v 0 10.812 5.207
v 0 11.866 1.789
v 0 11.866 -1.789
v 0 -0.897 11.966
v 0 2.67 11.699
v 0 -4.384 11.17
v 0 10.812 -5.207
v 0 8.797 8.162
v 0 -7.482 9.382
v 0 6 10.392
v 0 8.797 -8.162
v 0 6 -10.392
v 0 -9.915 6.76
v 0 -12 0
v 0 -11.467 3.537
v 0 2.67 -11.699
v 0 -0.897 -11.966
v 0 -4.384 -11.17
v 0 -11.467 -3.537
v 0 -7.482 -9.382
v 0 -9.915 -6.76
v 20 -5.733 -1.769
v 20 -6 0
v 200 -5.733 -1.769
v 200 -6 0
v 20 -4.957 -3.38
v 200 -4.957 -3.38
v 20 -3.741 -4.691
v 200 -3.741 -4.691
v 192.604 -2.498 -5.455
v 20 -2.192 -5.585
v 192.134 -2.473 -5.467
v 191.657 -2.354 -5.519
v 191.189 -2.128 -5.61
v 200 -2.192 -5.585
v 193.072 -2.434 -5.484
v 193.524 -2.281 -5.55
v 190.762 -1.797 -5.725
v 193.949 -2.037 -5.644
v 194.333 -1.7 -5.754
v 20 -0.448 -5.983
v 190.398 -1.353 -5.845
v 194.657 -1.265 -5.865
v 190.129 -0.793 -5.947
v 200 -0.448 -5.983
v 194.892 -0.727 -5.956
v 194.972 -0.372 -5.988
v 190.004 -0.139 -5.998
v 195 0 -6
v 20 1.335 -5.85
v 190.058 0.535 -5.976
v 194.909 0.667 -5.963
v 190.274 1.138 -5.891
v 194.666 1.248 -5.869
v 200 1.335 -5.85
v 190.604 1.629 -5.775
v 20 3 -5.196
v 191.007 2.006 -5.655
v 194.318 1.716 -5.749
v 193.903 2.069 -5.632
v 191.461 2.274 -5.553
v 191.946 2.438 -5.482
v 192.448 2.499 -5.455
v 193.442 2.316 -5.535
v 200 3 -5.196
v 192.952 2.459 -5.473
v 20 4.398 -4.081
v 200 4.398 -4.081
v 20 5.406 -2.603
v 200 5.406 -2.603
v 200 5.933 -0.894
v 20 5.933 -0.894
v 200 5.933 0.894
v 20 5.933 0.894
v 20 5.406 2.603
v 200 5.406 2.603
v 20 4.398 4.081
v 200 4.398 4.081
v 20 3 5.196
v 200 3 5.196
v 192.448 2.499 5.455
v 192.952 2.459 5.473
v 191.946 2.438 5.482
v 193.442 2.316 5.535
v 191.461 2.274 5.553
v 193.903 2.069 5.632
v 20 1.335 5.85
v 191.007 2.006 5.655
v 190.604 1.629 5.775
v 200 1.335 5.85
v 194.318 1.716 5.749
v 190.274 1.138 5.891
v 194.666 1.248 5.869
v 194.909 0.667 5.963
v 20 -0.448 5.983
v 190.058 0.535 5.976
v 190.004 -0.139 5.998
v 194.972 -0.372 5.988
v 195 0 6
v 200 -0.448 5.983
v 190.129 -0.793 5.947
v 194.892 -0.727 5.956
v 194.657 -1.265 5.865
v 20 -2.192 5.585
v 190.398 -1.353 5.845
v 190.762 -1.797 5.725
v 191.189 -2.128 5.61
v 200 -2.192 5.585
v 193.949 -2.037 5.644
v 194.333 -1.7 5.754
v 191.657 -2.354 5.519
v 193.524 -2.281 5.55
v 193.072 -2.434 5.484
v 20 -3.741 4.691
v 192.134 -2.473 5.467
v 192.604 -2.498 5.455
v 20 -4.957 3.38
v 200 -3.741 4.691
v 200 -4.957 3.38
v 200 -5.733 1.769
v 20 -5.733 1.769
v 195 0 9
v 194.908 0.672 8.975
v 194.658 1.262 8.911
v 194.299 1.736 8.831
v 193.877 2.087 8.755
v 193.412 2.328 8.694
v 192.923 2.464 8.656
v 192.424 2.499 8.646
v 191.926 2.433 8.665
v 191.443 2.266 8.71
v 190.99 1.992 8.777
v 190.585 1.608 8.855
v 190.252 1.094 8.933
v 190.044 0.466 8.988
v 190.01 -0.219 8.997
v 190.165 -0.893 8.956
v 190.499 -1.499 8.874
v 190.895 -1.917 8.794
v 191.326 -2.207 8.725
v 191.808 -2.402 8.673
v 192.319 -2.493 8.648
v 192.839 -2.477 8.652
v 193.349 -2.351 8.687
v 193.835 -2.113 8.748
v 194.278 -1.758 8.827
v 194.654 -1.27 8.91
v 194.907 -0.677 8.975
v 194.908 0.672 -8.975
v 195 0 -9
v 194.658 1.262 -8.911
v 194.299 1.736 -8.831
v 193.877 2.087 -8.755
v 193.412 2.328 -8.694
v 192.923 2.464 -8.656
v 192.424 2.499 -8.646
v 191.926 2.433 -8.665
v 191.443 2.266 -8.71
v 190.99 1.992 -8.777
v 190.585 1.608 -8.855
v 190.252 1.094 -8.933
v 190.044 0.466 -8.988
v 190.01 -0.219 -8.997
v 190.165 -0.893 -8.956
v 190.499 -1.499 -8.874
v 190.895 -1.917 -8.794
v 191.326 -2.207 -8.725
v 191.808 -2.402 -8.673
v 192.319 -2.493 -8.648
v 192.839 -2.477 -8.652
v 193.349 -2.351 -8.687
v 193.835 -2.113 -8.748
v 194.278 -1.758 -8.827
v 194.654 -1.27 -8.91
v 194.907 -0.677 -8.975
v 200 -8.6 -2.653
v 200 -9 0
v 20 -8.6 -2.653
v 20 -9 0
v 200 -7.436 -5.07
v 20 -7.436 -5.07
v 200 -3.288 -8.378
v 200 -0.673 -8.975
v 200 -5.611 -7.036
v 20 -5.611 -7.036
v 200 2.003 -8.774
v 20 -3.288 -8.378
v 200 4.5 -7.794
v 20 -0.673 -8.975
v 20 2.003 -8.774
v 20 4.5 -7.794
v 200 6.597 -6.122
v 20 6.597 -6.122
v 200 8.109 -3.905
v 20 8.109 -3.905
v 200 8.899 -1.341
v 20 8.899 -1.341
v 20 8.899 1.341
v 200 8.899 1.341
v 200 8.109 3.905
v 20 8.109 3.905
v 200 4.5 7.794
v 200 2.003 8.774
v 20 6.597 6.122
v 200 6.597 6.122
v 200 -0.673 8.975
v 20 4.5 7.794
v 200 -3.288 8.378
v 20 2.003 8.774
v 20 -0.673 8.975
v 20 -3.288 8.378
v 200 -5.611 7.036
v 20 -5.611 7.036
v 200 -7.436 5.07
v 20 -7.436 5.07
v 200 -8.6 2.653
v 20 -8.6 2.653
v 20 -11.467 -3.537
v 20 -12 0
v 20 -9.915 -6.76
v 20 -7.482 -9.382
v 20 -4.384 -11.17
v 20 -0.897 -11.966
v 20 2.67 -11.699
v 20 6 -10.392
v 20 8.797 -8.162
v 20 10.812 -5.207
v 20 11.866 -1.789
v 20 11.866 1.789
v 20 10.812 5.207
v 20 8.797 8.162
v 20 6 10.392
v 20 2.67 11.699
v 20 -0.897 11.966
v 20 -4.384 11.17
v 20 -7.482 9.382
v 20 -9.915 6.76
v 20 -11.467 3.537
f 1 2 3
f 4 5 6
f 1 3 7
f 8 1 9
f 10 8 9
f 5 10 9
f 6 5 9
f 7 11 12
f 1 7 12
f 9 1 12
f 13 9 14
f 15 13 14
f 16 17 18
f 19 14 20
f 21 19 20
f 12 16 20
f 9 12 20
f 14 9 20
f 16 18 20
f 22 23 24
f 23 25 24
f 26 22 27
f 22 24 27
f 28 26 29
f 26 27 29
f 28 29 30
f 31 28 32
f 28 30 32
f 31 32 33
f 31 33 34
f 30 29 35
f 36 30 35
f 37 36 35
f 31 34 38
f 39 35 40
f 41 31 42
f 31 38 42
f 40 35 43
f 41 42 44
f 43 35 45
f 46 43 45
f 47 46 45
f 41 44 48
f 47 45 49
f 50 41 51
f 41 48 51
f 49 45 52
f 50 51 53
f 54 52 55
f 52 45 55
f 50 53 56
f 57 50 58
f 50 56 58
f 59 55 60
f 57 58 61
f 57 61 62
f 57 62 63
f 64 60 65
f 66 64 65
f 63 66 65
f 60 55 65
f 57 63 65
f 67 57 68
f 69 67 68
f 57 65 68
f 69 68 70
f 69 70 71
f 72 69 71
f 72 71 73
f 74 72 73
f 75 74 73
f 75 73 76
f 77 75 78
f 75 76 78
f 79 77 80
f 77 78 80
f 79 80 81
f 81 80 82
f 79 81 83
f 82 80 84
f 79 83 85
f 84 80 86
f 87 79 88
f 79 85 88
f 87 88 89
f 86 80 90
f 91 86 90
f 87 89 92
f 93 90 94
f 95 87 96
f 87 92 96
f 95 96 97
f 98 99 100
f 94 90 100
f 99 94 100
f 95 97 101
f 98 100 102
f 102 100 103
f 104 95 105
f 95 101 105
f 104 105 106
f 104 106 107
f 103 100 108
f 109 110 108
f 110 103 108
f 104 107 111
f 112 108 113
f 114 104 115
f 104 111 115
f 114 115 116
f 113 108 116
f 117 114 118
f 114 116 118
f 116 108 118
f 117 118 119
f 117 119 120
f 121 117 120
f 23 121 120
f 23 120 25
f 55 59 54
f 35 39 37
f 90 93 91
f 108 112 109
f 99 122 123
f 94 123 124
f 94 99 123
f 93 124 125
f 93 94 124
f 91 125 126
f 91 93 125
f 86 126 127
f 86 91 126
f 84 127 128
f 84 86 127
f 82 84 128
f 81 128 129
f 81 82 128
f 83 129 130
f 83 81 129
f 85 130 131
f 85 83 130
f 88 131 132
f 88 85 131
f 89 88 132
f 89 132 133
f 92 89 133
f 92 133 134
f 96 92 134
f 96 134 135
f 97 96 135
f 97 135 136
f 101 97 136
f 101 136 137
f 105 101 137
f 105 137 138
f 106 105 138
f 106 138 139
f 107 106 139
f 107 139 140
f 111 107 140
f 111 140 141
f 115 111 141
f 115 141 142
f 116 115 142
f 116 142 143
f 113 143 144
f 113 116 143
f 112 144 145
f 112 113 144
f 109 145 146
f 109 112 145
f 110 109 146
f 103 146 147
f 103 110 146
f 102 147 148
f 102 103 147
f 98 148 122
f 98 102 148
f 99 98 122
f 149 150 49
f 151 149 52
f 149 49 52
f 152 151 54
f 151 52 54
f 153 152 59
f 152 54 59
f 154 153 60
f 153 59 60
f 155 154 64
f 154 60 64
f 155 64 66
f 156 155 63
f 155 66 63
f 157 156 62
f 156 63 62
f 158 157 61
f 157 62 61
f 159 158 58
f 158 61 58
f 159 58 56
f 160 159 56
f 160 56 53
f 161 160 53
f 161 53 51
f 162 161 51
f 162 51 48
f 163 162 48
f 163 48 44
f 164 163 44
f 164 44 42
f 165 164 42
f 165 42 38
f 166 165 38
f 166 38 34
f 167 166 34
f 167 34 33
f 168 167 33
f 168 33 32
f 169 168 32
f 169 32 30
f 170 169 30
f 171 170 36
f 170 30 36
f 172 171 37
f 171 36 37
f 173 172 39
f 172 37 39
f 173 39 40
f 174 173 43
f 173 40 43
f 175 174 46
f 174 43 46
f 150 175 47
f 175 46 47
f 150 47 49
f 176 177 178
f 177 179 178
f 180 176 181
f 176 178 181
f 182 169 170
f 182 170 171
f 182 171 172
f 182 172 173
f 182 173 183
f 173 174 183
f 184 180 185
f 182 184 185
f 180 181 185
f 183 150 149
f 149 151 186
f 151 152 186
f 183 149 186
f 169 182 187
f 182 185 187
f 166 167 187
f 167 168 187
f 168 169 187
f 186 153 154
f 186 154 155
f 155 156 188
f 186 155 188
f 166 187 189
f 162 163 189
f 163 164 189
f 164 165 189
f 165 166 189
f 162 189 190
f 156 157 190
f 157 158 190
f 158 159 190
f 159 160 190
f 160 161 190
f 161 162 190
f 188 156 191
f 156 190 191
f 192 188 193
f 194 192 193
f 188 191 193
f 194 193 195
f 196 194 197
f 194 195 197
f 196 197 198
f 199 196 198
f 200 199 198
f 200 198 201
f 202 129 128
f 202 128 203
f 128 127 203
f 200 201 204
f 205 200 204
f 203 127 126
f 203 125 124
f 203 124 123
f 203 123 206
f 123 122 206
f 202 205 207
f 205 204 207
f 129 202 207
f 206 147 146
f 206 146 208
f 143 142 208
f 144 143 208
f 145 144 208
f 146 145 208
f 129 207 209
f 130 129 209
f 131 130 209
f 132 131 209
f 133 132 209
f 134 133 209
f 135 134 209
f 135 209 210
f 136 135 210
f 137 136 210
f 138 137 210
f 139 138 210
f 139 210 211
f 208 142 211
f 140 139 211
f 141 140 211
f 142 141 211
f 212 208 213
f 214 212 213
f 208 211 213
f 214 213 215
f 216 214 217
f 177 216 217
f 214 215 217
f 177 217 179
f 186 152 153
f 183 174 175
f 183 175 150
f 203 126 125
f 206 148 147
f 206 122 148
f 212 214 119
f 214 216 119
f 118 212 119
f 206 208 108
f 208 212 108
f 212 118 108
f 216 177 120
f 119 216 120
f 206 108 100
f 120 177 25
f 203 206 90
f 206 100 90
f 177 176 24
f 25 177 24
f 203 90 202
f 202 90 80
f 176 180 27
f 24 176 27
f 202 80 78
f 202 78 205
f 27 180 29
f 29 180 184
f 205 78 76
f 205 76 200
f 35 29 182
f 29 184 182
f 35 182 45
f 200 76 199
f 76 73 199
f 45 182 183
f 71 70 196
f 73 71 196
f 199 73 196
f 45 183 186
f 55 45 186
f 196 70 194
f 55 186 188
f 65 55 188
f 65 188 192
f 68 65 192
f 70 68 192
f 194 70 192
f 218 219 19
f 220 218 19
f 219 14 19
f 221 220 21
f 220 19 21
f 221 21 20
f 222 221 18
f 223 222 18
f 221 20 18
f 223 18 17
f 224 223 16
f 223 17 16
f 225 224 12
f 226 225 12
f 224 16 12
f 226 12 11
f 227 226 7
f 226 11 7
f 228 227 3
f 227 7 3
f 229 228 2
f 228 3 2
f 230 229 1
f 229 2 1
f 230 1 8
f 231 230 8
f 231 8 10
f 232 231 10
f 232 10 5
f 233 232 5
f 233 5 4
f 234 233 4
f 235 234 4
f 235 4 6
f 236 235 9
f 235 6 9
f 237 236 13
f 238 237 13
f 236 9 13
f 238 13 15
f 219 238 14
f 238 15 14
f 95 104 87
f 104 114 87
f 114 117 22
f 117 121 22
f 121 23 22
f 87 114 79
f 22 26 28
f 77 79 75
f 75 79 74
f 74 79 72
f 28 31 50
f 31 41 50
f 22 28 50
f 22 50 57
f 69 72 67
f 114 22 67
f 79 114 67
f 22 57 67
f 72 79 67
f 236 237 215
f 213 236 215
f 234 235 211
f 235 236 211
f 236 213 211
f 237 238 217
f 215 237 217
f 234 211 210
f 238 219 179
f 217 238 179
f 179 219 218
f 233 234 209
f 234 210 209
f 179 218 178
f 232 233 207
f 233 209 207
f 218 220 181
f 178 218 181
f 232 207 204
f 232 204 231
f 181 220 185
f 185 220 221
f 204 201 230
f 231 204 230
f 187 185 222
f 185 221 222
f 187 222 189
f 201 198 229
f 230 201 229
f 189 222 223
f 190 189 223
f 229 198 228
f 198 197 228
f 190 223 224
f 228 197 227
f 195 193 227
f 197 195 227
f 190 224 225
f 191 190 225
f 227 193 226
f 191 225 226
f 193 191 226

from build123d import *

# Parameters (mm, degrees)
SKETCH2_R               = 2.5
CUT_EXTRUDE1_DEPTH      = 13
CUT_EXTRUDE1_DEPTH_BACK = 13


with BuildPart() as part:
    # Sketch1 → Revolve1 (revolve)
    with BuildSketch(Plane.XY):
        Polygon((0, 0), (20, 0), (20, -6), (200, -6), (200, -9), (20, -9), (20, -12), (0, -12), align=None)
    revolve(axis=Axis((0, 0, 0), (1, 0, 0)))

    # Sketch2 → Cut-Extrude1 (cut, two sides)
    with BuildSketch(Plane.XY) as cut_extrude1_sk:
        with Locations((192.5, 0)):
            Circle(SKETCH2_R)
    extrude(amount=CUT_EXTRUDE1_DEPTH, mode=Mode.SUBTRACT)
    extrude(cut_extrude1_sk.sketch, amount=-CUT_EXTRUDE1_DEPTH_BACK, mode=Mode.SUBTRACT)


solid = part.part
